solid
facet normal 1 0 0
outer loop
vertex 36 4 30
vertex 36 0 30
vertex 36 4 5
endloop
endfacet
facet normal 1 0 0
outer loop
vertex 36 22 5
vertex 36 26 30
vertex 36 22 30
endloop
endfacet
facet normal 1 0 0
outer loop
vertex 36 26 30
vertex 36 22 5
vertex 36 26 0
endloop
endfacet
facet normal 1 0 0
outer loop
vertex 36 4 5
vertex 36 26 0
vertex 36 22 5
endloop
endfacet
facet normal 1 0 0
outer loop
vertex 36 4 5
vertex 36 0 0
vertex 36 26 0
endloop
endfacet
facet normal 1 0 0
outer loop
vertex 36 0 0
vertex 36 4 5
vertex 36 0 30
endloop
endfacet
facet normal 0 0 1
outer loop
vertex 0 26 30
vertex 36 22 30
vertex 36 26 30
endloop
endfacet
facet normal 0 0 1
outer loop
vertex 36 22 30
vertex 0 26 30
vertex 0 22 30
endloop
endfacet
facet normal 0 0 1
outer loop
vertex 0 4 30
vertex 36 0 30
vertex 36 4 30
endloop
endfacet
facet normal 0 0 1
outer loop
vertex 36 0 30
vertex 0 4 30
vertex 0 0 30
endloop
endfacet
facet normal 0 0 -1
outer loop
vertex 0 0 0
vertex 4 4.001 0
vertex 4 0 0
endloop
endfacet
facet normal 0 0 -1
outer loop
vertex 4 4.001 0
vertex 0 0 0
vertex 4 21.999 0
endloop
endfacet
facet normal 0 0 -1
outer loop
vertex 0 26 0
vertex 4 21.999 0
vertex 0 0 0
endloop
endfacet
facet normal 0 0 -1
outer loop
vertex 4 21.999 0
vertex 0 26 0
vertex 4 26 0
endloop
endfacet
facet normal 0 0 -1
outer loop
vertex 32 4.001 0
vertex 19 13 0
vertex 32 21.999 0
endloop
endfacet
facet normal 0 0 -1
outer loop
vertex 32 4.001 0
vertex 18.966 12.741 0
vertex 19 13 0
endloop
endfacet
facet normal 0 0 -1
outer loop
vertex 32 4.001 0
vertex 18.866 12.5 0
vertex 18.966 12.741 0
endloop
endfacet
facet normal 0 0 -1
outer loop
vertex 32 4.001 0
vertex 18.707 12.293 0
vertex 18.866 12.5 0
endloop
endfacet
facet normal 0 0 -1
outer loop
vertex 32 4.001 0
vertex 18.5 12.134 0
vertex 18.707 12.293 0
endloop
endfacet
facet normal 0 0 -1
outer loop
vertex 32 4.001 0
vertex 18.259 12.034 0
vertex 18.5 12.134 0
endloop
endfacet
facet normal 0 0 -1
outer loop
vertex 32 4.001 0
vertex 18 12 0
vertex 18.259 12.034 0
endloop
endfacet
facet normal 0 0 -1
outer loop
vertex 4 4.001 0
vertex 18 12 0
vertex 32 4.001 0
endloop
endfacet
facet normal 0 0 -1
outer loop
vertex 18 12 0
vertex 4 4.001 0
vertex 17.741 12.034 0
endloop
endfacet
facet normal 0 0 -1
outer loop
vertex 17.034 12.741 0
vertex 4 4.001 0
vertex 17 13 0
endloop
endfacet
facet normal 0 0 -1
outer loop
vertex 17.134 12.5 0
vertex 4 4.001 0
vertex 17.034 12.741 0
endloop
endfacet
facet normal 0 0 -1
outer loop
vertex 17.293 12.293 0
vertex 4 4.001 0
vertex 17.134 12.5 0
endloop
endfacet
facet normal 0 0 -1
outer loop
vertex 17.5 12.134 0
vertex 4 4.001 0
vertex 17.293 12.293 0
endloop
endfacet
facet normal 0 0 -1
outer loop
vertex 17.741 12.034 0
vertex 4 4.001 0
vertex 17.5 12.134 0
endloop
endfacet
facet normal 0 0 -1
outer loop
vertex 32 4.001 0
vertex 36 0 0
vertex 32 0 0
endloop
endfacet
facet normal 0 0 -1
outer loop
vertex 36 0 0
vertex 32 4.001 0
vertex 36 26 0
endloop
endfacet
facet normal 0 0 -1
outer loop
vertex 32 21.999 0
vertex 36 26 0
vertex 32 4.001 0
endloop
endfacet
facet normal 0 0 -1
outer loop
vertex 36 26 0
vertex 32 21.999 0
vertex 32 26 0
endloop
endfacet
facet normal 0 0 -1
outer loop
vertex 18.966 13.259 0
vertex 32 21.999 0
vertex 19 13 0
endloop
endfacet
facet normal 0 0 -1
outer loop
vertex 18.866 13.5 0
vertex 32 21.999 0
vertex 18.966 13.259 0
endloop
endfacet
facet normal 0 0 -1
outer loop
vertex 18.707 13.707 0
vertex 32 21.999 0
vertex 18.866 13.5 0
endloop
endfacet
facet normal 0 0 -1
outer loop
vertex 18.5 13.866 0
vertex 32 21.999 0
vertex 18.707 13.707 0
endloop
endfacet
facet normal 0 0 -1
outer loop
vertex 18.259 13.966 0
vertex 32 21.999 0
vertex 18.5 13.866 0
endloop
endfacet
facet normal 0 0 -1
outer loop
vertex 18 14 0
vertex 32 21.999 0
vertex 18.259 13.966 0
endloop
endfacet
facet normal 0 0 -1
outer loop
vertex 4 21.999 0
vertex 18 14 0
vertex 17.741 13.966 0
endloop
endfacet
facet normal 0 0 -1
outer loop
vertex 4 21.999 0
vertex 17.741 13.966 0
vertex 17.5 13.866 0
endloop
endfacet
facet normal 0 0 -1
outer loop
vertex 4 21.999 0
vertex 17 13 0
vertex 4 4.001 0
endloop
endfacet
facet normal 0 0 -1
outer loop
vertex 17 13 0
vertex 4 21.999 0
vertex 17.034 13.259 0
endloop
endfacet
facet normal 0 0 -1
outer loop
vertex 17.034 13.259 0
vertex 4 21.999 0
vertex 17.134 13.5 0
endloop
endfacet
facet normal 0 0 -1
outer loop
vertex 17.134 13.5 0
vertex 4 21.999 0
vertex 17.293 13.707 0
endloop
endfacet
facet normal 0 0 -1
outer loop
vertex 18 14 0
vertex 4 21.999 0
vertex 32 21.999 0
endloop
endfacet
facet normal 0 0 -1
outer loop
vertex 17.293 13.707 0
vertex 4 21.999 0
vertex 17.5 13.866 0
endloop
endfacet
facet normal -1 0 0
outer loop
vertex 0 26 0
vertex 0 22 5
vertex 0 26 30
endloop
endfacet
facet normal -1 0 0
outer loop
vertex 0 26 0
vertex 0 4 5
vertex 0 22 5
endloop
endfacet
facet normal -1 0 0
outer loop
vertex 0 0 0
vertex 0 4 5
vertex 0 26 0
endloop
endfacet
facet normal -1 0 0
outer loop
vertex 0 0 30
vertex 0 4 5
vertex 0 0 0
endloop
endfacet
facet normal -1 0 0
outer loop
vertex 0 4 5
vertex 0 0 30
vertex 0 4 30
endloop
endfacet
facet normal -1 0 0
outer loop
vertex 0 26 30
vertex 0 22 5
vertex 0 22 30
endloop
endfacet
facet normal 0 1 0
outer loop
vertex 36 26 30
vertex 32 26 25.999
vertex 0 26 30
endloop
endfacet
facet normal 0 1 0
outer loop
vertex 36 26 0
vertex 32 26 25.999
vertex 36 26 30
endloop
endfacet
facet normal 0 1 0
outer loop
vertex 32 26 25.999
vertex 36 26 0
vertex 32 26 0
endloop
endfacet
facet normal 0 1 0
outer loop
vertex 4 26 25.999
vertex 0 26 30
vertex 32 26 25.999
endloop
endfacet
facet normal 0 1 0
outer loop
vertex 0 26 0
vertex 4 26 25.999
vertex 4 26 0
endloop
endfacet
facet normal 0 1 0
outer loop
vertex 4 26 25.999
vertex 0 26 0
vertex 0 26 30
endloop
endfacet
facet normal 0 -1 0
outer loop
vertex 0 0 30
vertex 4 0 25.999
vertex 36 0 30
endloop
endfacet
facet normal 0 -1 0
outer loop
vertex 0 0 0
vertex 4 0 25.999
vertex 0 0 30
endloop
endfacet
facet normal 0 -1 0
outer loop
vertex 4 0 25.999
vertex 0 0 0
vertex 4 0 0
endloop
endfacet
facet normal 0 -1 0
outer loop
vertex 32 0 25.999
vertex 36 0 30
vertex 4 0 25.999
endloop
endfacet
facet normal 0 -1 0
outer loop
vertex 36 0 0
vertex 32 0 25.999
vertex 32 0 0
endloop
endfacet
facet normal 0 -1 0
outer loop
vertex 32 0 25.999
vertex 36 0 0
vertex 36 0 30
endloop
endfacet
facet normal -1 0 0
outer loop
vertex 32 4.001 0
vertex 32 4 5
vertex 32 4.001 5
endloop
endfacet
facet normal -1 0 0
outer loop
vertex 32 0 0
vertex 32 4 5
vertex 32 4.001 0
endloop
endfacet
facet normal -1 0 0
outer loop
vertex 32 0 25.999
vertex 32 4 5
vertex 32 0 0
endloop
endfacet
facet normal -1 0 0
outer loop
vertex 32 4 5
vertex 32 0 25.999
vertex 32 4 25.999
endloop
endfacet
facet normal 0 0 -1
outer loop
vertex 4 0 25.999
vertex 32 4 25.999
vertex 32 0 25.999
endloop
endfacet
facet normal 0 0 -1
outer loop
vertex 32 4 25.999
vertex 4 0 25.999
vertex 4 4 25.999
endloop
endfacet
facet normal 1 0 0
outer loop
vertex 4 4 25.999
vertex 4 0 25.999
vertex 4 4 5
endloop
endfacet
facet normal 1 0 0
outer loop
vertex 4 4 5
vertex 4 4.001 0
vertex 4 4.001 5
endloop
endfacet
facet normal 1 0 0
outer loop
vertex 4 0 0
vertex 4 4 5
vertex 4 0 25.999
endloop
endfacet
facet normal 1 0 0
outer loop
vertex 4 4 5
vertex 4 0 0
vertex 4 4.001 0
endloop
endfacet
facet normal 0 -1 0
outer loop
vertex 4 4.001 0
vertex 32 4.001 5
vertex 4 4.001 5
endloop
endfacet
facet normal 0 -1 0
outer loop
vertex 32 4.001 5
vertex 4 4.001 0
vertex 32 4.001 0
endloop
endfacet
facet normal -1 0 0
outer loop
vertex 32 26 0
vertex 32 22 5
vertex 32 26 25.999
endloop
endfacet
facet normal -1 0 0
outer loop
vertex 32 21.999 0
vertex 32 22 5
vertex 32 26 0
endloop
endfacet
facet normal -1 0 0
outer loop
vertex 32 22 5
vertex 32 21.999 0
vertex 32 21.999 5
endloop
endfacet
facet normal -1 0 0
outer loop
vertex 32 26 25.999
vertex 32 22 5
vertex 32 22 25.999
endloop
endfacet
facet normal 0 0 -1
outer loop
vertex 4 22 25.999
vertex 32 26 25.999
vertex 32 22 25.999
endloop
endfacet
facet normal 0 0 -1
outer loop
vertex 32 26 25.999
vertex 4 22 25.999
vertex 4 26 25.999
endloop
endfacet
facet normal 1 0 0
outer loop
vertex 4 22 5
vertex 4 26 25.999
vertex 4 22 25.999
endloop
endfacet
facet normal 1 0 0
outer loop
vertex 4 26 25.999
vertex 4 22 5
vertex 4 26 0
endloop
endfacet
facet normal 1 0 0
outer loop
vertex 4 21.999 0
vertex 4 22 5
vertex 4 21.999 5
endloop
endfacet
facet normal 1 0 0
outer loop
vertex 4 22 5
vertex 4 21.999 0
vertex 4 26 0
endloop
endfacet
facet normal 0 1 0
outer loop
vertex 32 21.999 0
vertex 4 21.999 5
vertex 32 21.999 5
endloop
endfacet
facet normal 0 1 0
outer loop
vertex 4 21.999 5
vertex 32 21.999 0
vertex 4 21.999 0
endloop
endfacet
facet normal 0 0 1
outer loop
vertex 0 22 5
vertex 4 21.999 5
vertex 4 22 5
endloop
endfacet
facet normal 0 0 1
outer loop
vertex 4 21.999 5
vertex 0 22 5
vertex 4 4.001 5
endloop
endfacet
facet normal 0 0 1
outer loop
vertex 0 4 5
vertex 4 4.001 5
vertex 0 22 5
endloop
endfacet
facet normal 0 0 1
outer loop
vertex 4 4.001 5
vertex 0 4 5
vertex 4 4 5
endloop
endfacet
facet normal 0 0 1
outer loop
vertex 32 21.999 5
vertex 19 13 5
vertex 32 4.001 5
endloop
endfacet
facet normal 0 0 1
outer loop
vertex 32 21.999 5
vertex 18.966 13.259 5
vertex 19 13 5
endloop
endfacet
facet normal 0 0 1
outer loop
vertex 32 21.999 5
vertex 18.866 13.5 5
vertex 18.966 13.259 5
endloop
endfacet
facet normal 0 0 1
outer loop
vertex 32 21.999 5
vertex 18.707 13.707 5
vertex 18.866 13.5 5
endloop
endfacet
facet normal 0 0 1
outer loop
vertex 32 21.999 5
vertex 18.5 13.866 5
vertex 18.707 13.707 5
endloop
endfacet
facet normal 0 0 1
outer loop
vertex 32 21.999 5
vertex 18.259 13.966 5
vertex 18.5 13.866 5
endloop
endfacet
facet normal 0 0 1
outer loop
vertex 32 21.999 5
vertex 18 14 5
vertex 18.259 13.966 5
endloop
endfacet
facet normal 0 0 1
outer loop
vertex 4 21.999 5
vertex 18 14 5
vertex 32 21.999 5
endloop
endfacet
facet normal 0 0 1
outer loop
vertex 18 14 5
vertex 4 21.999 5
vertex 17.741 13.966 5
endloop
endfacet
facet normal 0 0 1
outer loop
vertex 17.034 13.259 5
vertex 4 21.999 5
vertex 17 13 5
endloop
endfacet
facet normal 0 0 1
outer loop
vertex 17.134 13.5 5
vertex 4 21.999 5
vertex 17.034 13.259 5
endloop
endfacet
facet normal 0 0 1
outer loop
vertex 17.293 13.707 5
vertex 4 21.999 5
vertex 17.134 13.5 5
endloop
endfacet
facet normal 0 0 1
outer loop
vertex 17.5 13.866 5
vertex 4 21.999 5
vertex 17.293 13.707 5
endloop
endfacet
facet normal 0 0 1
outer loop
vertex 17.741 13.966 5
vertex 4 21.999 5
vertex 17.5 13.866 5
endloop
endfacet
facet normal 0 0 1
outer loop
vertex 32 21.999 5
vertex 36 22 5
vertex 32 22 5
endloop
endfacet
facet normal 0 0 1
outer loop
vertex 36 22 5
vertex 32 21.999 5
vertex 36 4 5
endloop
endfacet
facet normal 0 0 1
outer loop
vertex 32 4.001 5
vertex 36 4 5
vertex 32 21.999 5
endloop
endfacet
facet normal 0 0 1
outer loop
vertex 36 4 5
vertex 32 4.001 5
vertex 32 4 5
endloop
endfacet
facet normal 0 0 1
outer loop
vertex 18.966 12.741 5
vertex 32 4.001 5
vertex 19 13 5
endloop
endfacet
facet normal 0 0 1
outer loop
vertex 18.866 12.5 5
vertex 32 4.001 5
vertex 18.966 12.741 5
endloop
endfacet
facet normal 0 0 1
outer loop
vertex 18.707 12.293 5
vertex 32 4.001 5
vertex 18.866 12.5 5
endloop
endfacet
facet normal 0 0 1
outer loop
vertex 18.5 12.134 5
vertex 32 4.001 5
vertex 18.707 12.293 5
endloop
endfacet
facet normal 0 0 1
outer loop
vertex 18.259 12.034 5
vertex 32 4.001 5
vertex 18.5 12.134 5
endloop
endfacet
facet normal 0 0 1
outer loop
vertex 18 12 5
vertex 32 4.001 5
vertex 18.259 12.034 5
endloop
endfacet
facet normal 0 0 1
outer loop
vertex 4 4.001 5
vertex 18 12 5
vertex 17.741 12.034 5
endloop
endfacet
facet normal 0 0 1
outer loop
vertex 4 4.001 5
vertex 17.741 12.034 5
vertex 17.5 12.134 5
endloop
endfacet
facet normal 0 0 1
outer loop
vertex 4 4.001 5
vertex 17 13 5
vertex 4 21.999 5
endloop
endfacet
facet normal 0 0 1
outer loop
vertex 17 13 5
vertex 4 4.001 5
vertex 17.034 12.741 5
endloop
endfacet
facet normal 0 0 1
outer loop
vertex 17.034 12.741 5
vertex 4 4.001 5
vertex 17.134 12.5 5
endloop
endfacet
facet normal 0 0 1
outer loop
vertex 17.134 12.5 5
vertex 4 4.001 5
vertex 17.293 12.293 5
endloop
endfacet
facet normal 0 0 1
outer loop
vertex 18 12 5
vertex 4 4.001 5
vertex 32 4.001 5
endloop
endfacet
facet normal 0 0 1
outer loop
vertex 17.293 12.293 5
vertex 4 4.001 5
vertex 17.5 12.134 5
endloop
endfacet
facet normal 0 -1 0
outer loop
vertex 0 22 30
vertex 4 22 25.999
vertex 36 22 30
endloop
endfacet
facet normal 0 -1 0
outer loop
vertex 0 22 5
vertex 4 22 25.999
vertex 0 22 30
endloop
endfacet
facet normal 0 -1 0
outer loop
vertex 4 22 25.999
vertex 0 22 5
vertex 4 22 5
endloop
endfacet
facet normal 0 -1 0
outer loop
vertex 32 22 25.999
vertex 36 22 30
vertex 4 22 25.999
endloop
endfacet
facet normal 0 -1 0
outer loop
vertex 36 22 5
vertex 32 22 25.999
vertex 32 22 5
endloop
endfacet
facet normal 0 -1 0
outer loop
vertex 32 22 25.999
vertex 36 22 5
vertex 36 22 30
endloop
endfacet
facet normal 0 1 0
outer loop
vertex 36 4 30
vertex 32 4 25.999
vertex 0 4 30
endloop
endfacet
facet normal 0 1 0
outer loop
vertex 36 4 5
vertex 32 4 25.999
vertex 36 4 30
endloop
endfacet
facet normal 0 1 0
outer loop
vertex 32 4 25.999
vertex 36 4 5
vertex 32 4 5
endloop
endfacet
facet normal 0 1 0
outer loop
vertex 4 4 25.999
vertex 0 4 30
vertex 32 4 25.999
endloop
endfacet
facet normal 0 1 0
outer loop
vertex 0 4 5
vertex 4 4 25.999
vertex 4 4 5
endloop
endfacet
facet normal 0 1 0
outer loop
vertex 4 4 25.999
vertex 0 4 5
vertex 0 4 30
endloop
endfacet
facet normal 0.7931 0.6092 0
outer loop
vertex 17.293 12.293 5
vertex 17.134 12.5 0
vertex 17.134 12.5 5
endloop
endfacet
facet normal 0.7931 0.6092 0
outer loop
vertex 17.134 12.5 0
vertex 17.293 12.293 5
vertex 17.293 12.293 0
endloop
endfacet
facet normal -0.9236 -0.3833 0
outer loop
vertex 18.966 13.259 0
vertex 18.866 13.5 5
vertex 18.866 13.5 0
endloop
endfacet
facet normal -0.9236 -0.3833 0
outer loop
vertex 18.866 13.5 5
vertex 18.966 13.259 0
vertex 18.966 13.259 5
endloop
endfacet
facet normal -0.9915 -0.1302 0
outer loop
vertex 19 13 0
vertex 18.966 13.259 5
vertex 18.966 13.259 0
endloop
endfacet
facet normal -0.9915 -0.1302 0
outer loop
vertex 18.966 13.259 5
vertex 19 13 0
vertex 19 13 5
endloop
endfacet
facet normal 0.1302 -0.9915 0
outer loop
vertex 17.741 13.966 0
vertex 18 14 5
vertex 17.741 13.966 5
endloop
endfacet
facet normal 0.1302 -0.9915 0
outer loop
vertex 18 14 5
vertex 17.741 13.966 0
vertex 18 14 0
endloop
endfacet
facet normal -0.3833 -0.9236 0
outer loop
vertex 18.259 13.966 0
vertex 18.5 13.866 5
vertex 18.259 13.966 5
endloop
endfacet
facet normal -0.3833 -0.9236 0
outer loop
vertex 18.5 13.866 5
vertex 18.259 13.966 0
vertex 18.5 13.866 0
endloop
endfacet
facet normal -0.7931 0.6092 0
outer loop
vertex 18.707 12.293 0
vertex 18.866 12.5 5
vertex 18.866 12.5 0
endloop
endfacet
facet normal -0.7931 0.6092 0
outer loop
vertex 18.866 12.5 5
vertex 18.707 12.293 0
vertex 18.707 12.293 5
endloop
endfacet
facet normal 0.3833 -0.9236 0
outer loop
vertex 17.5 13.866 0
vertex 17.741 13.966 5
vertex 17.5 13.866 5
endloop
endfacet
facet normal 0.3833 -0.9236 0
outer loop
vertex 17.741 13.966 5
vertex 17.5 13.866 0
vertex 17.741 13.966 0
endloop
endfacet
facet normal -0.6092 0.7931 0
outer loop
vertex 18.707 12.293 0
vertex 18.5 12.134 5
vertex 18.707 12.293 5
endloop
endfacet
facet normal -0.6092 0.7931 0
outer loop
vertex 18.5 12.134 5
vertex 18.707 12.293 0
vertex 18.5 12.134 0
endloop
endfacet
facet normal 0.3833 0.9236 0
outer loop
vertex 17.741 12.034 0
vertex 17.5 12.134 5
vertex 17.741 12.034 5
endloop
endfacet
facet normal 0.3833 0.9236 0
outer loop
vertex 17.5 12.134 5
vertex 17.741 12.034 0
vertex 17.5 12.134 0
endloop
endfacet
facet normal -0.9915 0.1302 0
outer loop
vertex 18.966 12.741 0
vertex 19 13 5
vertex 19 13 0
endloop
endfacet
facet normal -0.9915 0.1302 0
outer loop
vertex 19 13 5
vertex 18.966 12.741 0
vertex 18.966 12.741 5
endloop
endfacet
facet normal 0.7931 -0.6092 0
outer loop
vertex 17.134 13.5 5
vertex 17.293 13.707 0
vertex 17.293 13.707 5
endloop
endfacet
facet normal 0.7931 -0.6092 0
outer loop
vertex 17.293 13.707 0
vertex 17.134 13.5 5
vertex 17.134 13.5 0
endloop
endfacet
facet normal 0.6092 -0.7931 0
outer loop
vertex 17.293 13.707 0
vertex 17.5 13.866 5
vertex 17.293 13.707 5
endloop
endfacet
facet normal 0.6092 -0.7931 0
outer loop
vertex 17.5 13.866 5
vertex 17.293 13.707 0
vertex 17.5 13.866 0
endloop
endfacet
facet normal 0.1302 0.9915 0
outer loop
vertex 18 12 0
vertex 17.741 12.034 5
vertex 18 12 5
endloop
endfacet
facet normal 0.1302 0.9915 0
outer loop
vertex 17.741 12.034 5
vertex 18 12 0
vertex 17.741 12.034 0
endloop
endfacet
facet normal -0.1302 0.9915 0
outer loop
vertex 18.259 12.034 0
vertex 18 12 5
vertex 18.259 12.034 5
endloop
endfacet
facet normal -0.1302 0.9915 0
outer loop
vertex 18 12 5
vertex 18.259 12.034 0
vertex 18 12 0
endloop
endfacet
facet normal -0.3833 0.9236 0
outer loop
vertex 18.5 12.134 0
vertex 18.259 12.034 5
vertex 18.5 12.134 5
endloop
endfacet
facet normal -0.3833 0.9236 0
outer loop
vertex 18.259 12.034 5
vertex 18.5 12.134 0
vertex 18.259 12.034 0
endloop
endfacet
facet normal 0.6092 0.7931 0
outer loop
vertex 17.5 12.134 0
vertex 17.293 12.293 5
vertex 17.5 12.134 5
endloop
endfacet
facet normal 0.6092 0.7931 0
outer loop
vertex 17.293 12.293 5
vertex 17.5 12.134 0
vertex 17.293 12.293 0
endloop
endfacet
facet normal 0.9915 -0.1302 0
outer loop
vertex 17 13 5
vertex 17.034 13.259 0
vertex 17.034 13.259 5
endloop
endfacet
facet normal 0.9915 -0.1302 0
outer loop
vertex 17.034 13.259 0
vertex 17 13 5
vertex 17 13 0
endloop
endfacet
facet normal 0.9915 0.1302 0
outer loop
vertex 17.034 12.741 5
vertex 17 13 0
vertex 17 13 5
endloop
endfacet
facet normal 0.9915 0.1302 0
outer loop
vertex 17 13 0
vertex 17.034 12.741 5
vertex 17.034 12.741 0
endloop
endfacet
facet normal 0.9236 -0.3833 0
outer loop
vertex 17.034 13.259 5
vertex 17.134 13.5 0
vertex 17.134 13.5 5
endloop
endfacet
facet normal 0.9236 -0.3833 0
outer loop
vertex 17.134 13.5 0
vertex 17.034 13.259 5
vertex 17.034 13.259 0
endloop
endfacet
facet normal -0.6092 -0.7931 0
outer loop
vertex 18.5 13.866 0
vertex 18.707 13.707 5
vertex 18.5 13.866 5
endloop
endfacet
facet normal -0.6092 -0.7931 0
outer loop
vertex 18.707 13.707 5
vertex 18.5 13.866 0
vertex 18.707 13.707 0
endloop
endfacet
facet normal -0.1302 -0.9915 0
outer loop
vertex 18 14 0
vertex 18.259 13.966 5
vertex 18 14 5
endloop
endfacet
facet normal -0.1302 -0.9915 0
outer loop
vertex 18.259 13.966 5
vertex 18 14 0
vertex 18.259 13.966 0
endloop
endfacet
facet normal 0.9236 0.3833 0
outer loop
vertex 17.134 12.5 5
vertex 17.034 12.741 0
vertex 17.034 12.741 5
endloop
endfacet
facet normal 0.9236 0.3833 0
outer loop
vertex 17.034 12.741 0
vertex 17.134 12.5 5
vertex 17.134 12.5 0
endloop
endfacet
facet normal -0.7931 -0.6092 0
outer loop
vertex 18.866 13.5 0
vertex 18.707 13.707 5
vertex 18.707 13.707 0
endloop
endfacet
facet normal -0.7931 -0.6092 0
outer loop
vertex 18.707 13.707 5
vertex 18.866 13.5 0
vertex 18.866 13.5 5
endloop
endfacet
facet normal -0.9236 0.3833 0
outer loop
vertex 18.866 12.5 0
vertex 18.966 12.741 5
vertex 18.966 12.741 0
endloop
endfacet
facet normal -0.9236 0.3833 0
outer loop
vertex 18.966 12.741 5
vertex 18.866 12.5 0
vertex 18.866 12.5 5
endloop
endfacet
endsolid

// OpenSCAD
/* Author: Robert Niemöller */

//Diameter of the hole to be drilled
hole_diameter = 2;
//Thickness of the plank you want the hole in
plank_thickness = 18;
//Height of the plastic part to guide the drill
drill_guidance = 5;

/* [Hidden] */
//Distance from hole to side
length = max( 30, plank_thickness * 2 );
//Tickness of the outer guides
thickness = 4;
//Total height
height = drill_guidance + 25;

z_offset = (plank_thickness - hole_diameter < thickness) ? drill_guidance : 0;

$fn = 24;
difference(){
    cube([ length, plank_thickness + 2 * thickness, height ]);
    translate([ thickness, -1 + 0.001, z_offset -0.001 ])
        cube([ length - 2 * thickness, thickness + 1, height - thickness - z_offset ]);
    translate([ thickness, plank_thickness + thickness - 0.001, z_offset -0.001 ])
        cube([ length - 2 * thickness, thickness + 1, height - thickness - z_offset ]);
    translate([ -1, thickness, drill_guidance ])
        cube([ length + 2, plank_thickness, height ]);
    translate([ length/2, plank_thickness/2 + thickness, -1])
        cylinder( d = hole_diameter, h = height + 1 );
}
